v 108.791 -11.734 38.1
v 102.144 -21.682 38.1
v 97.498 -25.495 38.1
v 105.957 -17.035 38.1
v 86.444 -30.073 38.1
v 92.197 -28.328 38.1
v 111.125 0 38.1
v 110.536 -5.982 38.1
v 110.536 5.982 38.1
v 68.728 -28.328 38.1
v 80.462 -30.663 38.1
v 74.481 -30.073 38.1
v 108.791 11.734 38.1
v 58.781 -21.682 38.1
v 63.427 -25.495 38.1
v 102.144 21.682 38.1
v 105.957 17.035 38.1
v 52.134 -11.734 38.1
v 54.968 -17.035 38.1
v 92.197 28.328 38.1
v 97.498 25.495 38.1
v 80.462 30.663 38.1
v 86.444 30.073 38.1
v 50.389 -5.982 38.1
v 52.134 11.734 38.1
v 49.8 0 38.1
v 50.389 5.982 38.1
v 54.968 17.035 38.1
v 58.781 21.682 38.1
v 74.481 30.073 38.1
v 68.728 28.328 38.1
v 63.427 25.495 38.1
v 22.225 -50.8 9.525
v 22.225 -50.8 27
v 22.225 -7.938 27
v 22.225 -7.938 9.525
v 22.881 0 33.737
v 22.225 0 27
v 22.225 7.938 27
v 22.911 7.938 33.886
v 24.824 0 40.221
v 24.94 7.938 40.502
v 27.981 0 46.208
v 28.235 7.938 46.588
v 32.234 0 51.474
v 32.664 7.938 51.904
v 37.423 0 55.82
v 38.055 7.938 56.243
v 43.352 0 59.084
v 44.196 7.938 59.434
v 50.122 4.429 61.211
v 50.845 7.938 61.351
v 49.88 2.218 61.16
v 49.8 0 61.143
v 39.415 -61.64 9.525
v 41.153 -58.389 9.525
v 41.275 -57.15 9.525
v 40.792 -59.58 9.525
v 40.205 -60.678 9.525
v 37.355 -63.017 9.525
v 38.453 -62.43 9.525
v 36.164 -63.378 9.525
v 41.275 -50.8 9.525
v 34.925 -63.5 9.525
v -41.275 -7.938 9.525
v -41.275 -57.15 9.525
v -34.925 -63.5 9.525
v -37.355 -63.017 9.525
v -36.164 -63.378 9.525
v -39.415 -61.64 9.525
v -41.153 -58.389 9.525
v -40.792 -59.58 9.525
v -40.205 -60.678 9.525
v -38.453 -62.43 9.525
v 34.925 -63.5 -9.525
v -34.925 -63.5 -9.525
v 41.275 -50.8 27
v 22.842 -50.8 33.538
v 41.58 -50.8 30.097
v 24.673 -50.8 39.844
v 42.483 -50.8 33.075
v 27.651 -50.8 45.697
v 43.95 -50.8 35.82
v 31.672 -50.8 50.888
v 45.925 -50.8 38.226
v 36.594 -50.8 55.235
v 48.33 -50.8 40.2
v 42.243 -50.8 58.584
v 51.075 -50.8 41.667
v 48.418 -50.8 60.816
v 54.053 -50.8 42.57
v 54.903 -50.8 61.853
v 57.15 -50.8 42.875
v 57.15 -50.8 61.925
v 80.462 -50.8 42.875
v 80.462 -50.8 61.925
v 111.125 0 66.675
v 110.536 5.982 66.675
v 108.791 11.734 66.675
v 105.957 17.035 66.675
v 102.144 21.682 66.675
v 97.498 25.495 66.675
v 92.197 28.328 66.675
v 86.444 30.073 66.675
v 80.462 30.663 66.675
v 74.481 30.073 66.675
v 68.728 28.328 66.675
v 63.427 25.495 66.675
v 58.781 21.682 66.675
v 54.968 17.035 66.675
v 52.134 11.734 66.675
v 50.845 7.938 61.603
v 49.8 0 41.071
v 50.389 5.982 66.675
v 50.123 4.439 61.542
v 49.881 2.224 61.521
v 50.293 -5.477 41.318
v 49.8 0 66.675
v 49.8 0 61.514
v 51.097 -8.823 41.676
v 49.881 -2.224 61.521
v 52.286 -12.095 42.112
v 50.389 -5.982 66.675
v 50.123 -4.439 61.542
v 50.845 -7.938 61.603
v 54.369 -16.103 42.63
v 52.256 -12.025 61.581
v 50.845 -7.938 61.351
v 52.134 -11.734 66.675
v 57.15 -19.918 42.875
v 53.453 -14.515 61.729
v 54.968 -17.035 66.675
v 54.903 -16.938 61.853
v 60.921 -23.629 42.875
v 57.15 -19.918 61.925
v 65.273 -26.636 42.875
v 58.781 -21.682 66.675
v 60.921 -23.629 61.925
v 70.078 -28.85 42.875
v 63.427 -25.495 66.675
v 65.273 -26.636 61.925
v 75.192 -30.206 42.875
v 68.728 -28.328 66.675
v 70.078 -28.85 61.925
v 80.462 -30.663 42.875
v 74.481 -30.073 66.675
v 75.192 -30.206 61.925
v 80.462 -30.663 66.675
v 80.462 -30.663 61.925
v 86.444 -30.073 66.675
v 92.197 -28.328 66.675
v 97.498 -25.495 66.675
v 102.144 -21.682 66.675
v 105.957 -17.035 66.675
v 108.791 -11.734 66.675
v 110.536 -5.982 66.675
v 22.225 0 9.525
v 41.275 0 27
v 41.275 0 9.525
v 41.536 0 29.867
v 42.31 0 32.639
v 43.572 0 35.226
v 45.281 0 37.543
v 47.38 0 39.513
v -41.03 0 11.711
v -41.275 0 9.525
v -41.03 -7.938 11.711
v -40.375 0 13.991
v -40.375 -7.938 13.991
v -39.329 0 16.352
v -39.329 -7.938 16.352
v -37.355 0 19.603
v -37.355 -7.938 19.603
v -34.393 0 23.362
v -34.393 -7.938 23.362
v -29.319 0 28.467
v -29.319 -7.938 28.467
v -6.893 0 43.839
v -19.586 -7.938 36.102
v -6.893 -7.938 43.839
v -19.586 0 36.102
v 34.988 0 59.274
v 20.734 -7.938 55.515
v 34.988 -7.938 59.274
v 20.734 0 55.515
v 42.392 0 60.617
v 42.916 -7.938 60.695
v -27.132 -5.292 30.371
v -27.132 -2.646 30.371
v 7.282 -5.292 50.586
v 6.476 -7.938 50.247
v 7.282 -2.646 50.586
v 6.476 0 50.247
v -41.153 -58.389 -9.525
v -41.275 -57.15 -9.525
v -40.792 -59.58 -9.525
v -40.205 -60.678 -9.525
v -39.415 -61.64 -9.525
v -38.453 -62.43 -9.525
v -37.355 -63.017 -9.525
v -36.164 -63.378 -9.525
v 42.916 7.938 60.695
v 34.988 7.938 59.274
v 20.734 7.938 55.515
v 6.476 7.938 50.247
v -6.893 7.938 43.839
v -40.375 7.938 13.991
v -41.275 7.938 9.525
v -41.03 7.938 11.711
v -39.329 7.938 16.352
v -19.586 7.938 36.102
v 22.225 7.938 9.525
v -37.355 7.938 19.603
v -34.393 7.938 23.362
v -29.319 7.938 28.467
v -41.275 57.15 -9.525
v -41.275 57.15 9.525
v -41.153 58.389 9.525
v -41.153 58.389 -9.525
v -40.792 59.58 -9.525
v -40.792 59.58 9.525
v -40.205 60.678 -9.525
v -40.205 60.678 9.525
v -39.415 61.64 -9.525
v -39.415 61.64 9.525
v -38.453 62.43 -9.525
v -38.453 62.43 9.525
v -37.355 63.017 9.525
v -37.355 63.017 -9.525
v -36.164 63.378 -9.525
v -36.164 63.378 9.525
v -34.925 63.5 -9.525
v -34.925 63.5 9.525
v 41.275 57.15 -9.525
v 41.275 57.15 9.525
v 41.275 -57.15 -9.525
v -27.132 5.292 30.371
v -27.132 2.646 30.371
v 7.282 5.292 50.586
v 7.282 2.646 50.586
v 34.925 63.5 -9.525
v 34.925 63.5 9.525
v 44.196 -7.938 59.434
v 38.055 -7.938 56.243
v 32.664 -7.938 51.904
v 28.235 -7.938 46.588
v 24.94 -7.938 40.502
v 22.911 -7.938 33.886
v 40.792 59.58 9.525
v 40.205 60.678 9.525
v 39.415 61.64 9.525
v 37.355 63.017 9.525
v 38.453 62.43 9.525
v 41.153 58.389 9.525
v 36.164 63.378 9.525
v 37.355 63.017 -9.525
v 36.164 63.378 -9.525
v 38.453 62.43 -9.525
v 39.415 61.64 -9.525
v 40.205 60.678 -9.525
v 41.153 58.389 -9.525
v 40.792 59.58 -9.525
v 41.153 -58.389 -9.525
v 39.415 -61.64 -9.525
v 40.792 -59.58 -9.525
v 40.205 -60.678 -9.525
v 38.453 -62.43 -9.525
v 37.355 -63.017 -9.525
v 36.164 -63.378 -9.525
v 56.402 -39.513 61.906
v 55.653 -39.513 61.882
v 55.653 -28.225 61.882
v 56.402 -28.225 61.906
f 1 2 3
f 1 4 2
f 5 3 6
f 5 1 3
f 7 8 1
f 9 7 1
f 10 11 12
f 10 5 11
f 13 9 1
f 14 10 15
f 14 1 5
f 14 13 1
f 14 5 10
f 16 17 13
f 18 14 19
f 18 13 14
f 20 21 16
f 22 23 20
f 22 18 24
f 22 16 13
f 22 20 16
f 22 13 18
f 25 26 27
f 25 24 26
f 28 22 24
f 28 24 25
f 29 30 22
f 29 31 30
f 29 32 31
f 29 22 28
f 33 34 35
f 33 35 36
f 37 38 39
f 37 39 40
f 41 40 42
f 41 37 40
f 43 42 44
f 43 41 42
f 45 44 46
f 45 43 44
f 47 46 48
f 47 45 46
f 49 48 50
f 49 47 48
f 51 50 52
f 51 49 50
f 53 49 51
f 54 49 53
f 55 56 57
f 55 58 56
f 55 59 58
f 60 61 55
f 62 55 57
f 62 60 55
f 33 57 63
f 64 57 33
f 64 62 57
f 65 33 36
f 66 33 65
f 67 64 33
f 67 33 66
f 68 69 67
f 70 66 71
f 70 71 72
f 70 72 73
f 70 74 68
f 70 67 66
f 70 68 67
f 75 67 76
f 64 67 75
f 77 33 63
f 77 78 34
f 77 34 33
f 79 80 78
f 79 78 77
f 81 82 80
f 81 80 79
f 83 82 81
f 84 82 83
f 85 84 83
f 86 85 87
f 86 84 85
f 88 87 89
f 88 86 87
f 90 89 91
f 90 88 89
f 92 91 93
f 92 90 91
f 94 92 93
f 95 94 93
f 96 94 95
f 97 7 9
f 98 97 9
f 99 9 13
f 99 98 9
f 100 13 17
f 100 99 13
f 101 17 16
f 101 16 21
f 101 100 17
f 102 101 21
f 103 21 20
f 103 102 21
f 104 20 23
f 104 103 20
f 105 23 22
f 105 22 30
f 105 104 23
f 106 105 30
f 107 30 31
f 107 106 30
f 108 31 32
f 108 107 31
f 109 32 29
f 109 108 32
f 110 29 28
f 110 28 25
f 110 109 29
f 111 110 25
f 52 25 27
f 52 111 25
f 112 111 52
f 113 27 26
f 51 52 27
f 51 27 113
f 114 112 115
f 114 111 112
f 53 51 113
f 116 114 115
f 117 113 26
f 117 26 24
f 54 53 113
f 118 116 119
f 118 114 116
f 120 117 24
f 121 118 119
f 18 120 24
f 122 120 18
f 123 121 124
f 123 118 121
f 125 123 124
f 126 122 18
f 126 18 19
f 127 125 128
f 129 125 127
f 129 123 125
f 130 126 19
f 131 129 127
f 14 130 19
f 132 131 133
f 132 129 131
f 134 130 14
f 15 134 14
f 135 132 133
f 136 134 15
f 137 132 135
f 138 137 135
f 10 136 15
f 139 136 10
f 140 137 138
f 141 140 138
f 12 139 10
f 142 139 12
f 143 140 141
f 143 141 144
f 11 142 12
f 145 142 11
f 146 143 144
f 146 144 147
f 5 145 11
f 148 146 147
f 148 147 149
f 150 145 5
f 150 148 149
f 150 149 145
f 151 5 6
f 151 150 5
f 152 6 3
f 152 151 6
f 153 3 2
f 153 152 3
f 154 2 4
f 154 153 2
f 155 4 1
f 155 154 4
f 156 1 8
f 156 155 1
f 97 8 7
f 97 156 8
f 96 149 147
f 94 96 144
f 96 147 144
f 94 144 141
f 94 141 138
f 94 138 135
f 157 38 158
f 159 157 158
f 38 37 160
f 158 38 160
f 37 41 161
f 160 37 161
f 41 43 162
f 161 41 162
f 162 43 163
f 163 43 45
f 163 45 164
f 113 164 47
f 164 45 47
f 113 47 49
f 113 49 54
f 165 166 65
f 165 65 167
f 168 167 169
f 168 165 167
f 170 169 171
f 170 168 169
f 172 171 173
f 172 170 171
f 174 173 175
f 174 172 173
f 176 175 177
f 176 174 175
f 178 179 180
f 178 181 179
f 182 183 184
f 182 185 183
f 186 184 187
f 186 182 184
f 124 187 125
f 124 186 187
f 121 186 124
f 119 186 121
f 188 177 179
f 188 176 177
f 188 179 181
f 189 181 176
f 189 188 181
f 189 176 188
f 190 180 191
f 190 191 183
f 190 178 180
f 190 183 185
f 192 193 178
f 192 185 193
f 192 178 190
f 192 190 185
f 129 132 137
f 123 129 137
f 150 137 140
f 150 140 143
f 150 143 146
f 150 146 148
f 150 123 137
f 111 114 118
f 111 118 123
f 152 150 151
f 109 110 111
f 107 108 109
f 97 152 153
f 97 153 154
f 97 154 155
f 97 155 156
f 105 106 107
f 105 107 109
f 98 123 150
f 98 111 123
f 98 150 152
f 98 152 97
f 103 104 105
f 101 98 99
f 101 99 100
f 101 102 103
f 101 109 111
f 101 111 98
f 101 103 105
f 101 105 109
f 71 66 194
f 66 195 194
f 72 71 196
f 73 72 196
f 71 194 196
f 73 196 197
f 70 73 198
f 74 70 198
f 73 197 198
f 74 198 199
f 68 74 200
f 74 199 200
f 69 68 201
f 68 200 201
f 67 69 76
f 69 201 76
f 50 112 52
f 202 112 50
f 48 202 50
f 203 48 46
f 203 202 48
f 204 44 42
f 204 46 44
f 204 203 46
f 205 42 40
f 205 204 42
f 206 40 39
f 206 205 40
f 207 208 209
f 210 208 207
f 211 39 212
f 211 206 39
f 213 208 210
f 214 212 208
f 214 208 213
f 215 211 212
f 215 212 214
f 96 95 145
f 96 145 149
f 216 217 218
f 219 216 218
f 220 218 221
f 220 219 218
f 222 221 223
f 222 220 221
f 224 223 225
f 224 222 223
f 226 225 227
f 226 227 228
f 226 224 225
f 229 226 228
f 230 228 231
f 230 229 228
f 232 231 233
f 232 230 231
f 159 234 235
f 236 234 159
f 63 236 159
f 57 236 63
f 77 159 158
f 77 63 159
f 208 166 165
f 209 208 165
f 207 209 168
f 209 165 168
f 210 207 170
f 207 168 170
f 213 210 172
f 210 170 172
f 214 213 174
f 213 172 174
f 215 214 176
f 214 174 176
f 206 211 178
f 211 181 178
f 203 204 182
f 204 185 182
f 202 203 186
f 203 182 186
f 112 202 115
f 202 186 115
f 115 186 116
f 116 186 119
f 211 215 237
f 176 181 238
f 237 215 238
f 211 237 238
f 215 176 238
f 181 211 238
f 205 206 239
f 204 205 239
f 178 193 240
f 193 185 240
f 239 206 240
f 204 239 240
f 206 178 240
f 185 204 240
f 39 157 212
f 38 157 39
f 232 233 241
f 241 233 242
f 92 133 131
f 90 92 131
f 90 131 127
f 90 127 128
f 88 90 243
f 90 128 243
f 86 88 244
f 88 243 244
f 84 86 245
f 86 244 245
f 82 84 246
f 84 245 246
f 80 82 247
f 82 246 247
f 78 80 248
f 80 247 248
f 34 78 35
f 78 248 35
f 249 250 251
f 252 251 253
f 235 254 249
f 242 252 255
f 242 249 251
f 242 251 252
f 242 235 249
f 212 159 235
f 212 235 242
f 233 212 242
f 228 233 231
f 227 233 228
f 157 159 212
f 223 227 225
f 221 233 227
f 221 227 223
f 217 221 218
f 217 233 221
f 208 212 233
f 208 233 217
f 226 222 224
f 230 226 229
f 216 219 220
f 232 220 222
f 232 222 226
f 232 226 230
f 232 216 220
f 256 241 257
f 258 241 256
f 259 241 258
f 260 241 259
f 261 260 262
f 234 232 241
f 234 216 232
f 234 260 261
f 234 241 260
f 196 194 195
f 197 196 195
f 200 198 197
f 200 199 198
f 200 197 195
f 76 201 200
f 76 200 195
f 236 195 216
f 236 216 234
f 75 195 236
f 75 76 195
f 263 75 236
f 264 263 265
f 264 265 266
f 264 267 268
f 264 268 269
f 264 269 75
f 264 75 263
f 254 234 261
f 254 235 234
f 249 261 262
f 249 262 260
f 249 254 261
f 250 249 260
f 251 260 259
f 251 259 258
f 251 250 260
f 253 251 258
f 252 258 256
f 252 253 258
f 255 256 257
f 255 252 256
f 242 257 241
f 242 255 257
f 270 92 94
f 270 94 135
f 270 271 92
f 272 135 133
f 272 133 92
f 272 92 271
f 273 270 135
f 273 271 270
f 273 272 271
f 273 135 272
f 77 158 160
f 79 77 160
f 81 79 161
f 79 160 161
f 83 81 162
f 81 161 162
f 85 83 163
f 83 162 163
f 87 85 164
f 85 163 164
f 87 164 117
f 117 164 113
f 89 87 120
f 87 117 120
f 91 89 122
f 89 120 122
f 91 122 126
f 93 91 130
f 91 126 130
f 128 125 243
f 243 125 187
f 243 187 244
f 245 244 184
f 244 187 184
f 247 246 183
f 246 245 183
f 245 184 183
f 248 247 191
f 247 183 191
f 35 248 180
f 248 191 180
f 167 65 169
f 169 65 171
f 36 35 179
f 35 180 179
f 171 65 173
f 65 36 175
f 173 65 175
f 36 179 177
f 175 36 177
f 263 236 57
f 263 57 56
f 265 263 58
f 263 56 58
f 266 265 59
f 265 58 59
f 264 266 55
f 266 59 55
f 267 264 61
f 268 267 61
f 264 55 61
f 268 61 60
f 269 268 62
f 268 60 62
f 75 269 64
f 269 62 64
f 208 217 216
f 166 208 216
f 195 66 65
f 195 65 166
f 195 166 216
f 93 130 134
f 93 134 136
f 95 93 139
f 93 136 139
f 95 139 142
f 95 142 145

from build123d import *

# Parameters (mm, degrees)
F1_DEPTH = 63.5
F0_W     = 20.1374943917
F0_H     = 19.05
F2_DEPTH = 50.8
F3_DEPTH = 7.9375
F5_R     = 6.35


with BuildPart() as f1:
    # F0 (on Front) → F1 (new body, symmetric)
    with BuildSketch(Plane.XZ):
        Polygon((-41.275, 9.525), (-41.275, -9.525), (41.275, -9.525), (41.275, 9.525), (22.225, 9.525), align=None)
    extrude(amount=F1_DEPTH, both=True)

    # F0 (on Front) → F2 (join)
    with BuildSketch(Plane.XZ):
        with BuildLine():
            Line((22.225, 9.525), (41.275, 9.525))
            Line((41.275, 9.525), (41.275, 27.0002))
            ThreePointArc((41.275, 27.0002), (45.9246798487, 38.2255201513), (57.15, 42.8752))
            Line((57.15, 42.8752), (60.325, 42.8752))
            Line((60.325, 42.8752), (60.325, 61.9252))
            Line((60.325, 61.9252), (57.15, 61.9252))
            add(Edge.make_bspline(
                [(54.9027937698, 61.8528281528), (55.6532384905, 61.8850370345), (56.4023888872, 61.9092238899), (57.15, 61.9252)],
                knots=[109.6972732661, 109.6972732661, 109.6972732661, 109.6972732661, 111.5045361635, 111.5045361635, 111.5045361635, 111.5045361635], degree=3))
            ThreePointArc((54.9027937698, 61.8528281528), (31.6721733404, 50.8881880631), (22.225, 27.0002))
            Line((22.225, 27.0002), (22.225, 9.525))
        make_face()
        with Locations((70.3937471959, 52.4002)):
            Rectangle(F0_W, F0_H)
    extrude(amount=F2_DEPTH)

    # F0 (on Front) → F3 (join, symmetric)
    with BuildSketch(Plane.XZ):
        with BuildLine():
            add(Edge.make_bspline(
                [(-41.275, 9.525), (-40.9668306676, 28.3876541447), (9.352287687, 59.8978129225), (54.9027937698, 61.8528281528)],
                knots=[0, 0, 0, 0, 109.6972732661, 109.6972732661, 109.6972732661, 109.6972732661], degree=3))
            Line((-41.275, 9.525), (22.225, 9.525))
            Line((22.225, 9.525), (22.225, 27.0002))
            ThreePointArc((22.225, 27.0002), (31.6721733404, 50.8881880631), (54.9027937698, 61.8528281528))
        make_face()
    extrude(amount=F3_DEPTH, both=True)

    # F0 (on Front) → F4 (revolve)
    with BuildSketch(Plane.XZ):
        Polygon((80.4624943917, 66.675), (80.4624943917, 61.9252), (80.4624943917, 42.8752), (80.4624943917, 38.1), (111.125, 38.1), (111.125, 66.675), align=None)
    revolve(axis=Axis((80.4624943917, 0, 52.3875), (0, 0, 1)))

    # F5
    f5_edges = [f1.edges().sort_by_distance(p)[0] for p in [
        (41.275, -63.5, 0),
        (-41.275, -63.5, 0),
        (41.275, 63.5, 0),
        (-41.275, 63.5, 0),
    ]]
    fillet(f5_edges, radius=F5_R)


solid = f1.part
